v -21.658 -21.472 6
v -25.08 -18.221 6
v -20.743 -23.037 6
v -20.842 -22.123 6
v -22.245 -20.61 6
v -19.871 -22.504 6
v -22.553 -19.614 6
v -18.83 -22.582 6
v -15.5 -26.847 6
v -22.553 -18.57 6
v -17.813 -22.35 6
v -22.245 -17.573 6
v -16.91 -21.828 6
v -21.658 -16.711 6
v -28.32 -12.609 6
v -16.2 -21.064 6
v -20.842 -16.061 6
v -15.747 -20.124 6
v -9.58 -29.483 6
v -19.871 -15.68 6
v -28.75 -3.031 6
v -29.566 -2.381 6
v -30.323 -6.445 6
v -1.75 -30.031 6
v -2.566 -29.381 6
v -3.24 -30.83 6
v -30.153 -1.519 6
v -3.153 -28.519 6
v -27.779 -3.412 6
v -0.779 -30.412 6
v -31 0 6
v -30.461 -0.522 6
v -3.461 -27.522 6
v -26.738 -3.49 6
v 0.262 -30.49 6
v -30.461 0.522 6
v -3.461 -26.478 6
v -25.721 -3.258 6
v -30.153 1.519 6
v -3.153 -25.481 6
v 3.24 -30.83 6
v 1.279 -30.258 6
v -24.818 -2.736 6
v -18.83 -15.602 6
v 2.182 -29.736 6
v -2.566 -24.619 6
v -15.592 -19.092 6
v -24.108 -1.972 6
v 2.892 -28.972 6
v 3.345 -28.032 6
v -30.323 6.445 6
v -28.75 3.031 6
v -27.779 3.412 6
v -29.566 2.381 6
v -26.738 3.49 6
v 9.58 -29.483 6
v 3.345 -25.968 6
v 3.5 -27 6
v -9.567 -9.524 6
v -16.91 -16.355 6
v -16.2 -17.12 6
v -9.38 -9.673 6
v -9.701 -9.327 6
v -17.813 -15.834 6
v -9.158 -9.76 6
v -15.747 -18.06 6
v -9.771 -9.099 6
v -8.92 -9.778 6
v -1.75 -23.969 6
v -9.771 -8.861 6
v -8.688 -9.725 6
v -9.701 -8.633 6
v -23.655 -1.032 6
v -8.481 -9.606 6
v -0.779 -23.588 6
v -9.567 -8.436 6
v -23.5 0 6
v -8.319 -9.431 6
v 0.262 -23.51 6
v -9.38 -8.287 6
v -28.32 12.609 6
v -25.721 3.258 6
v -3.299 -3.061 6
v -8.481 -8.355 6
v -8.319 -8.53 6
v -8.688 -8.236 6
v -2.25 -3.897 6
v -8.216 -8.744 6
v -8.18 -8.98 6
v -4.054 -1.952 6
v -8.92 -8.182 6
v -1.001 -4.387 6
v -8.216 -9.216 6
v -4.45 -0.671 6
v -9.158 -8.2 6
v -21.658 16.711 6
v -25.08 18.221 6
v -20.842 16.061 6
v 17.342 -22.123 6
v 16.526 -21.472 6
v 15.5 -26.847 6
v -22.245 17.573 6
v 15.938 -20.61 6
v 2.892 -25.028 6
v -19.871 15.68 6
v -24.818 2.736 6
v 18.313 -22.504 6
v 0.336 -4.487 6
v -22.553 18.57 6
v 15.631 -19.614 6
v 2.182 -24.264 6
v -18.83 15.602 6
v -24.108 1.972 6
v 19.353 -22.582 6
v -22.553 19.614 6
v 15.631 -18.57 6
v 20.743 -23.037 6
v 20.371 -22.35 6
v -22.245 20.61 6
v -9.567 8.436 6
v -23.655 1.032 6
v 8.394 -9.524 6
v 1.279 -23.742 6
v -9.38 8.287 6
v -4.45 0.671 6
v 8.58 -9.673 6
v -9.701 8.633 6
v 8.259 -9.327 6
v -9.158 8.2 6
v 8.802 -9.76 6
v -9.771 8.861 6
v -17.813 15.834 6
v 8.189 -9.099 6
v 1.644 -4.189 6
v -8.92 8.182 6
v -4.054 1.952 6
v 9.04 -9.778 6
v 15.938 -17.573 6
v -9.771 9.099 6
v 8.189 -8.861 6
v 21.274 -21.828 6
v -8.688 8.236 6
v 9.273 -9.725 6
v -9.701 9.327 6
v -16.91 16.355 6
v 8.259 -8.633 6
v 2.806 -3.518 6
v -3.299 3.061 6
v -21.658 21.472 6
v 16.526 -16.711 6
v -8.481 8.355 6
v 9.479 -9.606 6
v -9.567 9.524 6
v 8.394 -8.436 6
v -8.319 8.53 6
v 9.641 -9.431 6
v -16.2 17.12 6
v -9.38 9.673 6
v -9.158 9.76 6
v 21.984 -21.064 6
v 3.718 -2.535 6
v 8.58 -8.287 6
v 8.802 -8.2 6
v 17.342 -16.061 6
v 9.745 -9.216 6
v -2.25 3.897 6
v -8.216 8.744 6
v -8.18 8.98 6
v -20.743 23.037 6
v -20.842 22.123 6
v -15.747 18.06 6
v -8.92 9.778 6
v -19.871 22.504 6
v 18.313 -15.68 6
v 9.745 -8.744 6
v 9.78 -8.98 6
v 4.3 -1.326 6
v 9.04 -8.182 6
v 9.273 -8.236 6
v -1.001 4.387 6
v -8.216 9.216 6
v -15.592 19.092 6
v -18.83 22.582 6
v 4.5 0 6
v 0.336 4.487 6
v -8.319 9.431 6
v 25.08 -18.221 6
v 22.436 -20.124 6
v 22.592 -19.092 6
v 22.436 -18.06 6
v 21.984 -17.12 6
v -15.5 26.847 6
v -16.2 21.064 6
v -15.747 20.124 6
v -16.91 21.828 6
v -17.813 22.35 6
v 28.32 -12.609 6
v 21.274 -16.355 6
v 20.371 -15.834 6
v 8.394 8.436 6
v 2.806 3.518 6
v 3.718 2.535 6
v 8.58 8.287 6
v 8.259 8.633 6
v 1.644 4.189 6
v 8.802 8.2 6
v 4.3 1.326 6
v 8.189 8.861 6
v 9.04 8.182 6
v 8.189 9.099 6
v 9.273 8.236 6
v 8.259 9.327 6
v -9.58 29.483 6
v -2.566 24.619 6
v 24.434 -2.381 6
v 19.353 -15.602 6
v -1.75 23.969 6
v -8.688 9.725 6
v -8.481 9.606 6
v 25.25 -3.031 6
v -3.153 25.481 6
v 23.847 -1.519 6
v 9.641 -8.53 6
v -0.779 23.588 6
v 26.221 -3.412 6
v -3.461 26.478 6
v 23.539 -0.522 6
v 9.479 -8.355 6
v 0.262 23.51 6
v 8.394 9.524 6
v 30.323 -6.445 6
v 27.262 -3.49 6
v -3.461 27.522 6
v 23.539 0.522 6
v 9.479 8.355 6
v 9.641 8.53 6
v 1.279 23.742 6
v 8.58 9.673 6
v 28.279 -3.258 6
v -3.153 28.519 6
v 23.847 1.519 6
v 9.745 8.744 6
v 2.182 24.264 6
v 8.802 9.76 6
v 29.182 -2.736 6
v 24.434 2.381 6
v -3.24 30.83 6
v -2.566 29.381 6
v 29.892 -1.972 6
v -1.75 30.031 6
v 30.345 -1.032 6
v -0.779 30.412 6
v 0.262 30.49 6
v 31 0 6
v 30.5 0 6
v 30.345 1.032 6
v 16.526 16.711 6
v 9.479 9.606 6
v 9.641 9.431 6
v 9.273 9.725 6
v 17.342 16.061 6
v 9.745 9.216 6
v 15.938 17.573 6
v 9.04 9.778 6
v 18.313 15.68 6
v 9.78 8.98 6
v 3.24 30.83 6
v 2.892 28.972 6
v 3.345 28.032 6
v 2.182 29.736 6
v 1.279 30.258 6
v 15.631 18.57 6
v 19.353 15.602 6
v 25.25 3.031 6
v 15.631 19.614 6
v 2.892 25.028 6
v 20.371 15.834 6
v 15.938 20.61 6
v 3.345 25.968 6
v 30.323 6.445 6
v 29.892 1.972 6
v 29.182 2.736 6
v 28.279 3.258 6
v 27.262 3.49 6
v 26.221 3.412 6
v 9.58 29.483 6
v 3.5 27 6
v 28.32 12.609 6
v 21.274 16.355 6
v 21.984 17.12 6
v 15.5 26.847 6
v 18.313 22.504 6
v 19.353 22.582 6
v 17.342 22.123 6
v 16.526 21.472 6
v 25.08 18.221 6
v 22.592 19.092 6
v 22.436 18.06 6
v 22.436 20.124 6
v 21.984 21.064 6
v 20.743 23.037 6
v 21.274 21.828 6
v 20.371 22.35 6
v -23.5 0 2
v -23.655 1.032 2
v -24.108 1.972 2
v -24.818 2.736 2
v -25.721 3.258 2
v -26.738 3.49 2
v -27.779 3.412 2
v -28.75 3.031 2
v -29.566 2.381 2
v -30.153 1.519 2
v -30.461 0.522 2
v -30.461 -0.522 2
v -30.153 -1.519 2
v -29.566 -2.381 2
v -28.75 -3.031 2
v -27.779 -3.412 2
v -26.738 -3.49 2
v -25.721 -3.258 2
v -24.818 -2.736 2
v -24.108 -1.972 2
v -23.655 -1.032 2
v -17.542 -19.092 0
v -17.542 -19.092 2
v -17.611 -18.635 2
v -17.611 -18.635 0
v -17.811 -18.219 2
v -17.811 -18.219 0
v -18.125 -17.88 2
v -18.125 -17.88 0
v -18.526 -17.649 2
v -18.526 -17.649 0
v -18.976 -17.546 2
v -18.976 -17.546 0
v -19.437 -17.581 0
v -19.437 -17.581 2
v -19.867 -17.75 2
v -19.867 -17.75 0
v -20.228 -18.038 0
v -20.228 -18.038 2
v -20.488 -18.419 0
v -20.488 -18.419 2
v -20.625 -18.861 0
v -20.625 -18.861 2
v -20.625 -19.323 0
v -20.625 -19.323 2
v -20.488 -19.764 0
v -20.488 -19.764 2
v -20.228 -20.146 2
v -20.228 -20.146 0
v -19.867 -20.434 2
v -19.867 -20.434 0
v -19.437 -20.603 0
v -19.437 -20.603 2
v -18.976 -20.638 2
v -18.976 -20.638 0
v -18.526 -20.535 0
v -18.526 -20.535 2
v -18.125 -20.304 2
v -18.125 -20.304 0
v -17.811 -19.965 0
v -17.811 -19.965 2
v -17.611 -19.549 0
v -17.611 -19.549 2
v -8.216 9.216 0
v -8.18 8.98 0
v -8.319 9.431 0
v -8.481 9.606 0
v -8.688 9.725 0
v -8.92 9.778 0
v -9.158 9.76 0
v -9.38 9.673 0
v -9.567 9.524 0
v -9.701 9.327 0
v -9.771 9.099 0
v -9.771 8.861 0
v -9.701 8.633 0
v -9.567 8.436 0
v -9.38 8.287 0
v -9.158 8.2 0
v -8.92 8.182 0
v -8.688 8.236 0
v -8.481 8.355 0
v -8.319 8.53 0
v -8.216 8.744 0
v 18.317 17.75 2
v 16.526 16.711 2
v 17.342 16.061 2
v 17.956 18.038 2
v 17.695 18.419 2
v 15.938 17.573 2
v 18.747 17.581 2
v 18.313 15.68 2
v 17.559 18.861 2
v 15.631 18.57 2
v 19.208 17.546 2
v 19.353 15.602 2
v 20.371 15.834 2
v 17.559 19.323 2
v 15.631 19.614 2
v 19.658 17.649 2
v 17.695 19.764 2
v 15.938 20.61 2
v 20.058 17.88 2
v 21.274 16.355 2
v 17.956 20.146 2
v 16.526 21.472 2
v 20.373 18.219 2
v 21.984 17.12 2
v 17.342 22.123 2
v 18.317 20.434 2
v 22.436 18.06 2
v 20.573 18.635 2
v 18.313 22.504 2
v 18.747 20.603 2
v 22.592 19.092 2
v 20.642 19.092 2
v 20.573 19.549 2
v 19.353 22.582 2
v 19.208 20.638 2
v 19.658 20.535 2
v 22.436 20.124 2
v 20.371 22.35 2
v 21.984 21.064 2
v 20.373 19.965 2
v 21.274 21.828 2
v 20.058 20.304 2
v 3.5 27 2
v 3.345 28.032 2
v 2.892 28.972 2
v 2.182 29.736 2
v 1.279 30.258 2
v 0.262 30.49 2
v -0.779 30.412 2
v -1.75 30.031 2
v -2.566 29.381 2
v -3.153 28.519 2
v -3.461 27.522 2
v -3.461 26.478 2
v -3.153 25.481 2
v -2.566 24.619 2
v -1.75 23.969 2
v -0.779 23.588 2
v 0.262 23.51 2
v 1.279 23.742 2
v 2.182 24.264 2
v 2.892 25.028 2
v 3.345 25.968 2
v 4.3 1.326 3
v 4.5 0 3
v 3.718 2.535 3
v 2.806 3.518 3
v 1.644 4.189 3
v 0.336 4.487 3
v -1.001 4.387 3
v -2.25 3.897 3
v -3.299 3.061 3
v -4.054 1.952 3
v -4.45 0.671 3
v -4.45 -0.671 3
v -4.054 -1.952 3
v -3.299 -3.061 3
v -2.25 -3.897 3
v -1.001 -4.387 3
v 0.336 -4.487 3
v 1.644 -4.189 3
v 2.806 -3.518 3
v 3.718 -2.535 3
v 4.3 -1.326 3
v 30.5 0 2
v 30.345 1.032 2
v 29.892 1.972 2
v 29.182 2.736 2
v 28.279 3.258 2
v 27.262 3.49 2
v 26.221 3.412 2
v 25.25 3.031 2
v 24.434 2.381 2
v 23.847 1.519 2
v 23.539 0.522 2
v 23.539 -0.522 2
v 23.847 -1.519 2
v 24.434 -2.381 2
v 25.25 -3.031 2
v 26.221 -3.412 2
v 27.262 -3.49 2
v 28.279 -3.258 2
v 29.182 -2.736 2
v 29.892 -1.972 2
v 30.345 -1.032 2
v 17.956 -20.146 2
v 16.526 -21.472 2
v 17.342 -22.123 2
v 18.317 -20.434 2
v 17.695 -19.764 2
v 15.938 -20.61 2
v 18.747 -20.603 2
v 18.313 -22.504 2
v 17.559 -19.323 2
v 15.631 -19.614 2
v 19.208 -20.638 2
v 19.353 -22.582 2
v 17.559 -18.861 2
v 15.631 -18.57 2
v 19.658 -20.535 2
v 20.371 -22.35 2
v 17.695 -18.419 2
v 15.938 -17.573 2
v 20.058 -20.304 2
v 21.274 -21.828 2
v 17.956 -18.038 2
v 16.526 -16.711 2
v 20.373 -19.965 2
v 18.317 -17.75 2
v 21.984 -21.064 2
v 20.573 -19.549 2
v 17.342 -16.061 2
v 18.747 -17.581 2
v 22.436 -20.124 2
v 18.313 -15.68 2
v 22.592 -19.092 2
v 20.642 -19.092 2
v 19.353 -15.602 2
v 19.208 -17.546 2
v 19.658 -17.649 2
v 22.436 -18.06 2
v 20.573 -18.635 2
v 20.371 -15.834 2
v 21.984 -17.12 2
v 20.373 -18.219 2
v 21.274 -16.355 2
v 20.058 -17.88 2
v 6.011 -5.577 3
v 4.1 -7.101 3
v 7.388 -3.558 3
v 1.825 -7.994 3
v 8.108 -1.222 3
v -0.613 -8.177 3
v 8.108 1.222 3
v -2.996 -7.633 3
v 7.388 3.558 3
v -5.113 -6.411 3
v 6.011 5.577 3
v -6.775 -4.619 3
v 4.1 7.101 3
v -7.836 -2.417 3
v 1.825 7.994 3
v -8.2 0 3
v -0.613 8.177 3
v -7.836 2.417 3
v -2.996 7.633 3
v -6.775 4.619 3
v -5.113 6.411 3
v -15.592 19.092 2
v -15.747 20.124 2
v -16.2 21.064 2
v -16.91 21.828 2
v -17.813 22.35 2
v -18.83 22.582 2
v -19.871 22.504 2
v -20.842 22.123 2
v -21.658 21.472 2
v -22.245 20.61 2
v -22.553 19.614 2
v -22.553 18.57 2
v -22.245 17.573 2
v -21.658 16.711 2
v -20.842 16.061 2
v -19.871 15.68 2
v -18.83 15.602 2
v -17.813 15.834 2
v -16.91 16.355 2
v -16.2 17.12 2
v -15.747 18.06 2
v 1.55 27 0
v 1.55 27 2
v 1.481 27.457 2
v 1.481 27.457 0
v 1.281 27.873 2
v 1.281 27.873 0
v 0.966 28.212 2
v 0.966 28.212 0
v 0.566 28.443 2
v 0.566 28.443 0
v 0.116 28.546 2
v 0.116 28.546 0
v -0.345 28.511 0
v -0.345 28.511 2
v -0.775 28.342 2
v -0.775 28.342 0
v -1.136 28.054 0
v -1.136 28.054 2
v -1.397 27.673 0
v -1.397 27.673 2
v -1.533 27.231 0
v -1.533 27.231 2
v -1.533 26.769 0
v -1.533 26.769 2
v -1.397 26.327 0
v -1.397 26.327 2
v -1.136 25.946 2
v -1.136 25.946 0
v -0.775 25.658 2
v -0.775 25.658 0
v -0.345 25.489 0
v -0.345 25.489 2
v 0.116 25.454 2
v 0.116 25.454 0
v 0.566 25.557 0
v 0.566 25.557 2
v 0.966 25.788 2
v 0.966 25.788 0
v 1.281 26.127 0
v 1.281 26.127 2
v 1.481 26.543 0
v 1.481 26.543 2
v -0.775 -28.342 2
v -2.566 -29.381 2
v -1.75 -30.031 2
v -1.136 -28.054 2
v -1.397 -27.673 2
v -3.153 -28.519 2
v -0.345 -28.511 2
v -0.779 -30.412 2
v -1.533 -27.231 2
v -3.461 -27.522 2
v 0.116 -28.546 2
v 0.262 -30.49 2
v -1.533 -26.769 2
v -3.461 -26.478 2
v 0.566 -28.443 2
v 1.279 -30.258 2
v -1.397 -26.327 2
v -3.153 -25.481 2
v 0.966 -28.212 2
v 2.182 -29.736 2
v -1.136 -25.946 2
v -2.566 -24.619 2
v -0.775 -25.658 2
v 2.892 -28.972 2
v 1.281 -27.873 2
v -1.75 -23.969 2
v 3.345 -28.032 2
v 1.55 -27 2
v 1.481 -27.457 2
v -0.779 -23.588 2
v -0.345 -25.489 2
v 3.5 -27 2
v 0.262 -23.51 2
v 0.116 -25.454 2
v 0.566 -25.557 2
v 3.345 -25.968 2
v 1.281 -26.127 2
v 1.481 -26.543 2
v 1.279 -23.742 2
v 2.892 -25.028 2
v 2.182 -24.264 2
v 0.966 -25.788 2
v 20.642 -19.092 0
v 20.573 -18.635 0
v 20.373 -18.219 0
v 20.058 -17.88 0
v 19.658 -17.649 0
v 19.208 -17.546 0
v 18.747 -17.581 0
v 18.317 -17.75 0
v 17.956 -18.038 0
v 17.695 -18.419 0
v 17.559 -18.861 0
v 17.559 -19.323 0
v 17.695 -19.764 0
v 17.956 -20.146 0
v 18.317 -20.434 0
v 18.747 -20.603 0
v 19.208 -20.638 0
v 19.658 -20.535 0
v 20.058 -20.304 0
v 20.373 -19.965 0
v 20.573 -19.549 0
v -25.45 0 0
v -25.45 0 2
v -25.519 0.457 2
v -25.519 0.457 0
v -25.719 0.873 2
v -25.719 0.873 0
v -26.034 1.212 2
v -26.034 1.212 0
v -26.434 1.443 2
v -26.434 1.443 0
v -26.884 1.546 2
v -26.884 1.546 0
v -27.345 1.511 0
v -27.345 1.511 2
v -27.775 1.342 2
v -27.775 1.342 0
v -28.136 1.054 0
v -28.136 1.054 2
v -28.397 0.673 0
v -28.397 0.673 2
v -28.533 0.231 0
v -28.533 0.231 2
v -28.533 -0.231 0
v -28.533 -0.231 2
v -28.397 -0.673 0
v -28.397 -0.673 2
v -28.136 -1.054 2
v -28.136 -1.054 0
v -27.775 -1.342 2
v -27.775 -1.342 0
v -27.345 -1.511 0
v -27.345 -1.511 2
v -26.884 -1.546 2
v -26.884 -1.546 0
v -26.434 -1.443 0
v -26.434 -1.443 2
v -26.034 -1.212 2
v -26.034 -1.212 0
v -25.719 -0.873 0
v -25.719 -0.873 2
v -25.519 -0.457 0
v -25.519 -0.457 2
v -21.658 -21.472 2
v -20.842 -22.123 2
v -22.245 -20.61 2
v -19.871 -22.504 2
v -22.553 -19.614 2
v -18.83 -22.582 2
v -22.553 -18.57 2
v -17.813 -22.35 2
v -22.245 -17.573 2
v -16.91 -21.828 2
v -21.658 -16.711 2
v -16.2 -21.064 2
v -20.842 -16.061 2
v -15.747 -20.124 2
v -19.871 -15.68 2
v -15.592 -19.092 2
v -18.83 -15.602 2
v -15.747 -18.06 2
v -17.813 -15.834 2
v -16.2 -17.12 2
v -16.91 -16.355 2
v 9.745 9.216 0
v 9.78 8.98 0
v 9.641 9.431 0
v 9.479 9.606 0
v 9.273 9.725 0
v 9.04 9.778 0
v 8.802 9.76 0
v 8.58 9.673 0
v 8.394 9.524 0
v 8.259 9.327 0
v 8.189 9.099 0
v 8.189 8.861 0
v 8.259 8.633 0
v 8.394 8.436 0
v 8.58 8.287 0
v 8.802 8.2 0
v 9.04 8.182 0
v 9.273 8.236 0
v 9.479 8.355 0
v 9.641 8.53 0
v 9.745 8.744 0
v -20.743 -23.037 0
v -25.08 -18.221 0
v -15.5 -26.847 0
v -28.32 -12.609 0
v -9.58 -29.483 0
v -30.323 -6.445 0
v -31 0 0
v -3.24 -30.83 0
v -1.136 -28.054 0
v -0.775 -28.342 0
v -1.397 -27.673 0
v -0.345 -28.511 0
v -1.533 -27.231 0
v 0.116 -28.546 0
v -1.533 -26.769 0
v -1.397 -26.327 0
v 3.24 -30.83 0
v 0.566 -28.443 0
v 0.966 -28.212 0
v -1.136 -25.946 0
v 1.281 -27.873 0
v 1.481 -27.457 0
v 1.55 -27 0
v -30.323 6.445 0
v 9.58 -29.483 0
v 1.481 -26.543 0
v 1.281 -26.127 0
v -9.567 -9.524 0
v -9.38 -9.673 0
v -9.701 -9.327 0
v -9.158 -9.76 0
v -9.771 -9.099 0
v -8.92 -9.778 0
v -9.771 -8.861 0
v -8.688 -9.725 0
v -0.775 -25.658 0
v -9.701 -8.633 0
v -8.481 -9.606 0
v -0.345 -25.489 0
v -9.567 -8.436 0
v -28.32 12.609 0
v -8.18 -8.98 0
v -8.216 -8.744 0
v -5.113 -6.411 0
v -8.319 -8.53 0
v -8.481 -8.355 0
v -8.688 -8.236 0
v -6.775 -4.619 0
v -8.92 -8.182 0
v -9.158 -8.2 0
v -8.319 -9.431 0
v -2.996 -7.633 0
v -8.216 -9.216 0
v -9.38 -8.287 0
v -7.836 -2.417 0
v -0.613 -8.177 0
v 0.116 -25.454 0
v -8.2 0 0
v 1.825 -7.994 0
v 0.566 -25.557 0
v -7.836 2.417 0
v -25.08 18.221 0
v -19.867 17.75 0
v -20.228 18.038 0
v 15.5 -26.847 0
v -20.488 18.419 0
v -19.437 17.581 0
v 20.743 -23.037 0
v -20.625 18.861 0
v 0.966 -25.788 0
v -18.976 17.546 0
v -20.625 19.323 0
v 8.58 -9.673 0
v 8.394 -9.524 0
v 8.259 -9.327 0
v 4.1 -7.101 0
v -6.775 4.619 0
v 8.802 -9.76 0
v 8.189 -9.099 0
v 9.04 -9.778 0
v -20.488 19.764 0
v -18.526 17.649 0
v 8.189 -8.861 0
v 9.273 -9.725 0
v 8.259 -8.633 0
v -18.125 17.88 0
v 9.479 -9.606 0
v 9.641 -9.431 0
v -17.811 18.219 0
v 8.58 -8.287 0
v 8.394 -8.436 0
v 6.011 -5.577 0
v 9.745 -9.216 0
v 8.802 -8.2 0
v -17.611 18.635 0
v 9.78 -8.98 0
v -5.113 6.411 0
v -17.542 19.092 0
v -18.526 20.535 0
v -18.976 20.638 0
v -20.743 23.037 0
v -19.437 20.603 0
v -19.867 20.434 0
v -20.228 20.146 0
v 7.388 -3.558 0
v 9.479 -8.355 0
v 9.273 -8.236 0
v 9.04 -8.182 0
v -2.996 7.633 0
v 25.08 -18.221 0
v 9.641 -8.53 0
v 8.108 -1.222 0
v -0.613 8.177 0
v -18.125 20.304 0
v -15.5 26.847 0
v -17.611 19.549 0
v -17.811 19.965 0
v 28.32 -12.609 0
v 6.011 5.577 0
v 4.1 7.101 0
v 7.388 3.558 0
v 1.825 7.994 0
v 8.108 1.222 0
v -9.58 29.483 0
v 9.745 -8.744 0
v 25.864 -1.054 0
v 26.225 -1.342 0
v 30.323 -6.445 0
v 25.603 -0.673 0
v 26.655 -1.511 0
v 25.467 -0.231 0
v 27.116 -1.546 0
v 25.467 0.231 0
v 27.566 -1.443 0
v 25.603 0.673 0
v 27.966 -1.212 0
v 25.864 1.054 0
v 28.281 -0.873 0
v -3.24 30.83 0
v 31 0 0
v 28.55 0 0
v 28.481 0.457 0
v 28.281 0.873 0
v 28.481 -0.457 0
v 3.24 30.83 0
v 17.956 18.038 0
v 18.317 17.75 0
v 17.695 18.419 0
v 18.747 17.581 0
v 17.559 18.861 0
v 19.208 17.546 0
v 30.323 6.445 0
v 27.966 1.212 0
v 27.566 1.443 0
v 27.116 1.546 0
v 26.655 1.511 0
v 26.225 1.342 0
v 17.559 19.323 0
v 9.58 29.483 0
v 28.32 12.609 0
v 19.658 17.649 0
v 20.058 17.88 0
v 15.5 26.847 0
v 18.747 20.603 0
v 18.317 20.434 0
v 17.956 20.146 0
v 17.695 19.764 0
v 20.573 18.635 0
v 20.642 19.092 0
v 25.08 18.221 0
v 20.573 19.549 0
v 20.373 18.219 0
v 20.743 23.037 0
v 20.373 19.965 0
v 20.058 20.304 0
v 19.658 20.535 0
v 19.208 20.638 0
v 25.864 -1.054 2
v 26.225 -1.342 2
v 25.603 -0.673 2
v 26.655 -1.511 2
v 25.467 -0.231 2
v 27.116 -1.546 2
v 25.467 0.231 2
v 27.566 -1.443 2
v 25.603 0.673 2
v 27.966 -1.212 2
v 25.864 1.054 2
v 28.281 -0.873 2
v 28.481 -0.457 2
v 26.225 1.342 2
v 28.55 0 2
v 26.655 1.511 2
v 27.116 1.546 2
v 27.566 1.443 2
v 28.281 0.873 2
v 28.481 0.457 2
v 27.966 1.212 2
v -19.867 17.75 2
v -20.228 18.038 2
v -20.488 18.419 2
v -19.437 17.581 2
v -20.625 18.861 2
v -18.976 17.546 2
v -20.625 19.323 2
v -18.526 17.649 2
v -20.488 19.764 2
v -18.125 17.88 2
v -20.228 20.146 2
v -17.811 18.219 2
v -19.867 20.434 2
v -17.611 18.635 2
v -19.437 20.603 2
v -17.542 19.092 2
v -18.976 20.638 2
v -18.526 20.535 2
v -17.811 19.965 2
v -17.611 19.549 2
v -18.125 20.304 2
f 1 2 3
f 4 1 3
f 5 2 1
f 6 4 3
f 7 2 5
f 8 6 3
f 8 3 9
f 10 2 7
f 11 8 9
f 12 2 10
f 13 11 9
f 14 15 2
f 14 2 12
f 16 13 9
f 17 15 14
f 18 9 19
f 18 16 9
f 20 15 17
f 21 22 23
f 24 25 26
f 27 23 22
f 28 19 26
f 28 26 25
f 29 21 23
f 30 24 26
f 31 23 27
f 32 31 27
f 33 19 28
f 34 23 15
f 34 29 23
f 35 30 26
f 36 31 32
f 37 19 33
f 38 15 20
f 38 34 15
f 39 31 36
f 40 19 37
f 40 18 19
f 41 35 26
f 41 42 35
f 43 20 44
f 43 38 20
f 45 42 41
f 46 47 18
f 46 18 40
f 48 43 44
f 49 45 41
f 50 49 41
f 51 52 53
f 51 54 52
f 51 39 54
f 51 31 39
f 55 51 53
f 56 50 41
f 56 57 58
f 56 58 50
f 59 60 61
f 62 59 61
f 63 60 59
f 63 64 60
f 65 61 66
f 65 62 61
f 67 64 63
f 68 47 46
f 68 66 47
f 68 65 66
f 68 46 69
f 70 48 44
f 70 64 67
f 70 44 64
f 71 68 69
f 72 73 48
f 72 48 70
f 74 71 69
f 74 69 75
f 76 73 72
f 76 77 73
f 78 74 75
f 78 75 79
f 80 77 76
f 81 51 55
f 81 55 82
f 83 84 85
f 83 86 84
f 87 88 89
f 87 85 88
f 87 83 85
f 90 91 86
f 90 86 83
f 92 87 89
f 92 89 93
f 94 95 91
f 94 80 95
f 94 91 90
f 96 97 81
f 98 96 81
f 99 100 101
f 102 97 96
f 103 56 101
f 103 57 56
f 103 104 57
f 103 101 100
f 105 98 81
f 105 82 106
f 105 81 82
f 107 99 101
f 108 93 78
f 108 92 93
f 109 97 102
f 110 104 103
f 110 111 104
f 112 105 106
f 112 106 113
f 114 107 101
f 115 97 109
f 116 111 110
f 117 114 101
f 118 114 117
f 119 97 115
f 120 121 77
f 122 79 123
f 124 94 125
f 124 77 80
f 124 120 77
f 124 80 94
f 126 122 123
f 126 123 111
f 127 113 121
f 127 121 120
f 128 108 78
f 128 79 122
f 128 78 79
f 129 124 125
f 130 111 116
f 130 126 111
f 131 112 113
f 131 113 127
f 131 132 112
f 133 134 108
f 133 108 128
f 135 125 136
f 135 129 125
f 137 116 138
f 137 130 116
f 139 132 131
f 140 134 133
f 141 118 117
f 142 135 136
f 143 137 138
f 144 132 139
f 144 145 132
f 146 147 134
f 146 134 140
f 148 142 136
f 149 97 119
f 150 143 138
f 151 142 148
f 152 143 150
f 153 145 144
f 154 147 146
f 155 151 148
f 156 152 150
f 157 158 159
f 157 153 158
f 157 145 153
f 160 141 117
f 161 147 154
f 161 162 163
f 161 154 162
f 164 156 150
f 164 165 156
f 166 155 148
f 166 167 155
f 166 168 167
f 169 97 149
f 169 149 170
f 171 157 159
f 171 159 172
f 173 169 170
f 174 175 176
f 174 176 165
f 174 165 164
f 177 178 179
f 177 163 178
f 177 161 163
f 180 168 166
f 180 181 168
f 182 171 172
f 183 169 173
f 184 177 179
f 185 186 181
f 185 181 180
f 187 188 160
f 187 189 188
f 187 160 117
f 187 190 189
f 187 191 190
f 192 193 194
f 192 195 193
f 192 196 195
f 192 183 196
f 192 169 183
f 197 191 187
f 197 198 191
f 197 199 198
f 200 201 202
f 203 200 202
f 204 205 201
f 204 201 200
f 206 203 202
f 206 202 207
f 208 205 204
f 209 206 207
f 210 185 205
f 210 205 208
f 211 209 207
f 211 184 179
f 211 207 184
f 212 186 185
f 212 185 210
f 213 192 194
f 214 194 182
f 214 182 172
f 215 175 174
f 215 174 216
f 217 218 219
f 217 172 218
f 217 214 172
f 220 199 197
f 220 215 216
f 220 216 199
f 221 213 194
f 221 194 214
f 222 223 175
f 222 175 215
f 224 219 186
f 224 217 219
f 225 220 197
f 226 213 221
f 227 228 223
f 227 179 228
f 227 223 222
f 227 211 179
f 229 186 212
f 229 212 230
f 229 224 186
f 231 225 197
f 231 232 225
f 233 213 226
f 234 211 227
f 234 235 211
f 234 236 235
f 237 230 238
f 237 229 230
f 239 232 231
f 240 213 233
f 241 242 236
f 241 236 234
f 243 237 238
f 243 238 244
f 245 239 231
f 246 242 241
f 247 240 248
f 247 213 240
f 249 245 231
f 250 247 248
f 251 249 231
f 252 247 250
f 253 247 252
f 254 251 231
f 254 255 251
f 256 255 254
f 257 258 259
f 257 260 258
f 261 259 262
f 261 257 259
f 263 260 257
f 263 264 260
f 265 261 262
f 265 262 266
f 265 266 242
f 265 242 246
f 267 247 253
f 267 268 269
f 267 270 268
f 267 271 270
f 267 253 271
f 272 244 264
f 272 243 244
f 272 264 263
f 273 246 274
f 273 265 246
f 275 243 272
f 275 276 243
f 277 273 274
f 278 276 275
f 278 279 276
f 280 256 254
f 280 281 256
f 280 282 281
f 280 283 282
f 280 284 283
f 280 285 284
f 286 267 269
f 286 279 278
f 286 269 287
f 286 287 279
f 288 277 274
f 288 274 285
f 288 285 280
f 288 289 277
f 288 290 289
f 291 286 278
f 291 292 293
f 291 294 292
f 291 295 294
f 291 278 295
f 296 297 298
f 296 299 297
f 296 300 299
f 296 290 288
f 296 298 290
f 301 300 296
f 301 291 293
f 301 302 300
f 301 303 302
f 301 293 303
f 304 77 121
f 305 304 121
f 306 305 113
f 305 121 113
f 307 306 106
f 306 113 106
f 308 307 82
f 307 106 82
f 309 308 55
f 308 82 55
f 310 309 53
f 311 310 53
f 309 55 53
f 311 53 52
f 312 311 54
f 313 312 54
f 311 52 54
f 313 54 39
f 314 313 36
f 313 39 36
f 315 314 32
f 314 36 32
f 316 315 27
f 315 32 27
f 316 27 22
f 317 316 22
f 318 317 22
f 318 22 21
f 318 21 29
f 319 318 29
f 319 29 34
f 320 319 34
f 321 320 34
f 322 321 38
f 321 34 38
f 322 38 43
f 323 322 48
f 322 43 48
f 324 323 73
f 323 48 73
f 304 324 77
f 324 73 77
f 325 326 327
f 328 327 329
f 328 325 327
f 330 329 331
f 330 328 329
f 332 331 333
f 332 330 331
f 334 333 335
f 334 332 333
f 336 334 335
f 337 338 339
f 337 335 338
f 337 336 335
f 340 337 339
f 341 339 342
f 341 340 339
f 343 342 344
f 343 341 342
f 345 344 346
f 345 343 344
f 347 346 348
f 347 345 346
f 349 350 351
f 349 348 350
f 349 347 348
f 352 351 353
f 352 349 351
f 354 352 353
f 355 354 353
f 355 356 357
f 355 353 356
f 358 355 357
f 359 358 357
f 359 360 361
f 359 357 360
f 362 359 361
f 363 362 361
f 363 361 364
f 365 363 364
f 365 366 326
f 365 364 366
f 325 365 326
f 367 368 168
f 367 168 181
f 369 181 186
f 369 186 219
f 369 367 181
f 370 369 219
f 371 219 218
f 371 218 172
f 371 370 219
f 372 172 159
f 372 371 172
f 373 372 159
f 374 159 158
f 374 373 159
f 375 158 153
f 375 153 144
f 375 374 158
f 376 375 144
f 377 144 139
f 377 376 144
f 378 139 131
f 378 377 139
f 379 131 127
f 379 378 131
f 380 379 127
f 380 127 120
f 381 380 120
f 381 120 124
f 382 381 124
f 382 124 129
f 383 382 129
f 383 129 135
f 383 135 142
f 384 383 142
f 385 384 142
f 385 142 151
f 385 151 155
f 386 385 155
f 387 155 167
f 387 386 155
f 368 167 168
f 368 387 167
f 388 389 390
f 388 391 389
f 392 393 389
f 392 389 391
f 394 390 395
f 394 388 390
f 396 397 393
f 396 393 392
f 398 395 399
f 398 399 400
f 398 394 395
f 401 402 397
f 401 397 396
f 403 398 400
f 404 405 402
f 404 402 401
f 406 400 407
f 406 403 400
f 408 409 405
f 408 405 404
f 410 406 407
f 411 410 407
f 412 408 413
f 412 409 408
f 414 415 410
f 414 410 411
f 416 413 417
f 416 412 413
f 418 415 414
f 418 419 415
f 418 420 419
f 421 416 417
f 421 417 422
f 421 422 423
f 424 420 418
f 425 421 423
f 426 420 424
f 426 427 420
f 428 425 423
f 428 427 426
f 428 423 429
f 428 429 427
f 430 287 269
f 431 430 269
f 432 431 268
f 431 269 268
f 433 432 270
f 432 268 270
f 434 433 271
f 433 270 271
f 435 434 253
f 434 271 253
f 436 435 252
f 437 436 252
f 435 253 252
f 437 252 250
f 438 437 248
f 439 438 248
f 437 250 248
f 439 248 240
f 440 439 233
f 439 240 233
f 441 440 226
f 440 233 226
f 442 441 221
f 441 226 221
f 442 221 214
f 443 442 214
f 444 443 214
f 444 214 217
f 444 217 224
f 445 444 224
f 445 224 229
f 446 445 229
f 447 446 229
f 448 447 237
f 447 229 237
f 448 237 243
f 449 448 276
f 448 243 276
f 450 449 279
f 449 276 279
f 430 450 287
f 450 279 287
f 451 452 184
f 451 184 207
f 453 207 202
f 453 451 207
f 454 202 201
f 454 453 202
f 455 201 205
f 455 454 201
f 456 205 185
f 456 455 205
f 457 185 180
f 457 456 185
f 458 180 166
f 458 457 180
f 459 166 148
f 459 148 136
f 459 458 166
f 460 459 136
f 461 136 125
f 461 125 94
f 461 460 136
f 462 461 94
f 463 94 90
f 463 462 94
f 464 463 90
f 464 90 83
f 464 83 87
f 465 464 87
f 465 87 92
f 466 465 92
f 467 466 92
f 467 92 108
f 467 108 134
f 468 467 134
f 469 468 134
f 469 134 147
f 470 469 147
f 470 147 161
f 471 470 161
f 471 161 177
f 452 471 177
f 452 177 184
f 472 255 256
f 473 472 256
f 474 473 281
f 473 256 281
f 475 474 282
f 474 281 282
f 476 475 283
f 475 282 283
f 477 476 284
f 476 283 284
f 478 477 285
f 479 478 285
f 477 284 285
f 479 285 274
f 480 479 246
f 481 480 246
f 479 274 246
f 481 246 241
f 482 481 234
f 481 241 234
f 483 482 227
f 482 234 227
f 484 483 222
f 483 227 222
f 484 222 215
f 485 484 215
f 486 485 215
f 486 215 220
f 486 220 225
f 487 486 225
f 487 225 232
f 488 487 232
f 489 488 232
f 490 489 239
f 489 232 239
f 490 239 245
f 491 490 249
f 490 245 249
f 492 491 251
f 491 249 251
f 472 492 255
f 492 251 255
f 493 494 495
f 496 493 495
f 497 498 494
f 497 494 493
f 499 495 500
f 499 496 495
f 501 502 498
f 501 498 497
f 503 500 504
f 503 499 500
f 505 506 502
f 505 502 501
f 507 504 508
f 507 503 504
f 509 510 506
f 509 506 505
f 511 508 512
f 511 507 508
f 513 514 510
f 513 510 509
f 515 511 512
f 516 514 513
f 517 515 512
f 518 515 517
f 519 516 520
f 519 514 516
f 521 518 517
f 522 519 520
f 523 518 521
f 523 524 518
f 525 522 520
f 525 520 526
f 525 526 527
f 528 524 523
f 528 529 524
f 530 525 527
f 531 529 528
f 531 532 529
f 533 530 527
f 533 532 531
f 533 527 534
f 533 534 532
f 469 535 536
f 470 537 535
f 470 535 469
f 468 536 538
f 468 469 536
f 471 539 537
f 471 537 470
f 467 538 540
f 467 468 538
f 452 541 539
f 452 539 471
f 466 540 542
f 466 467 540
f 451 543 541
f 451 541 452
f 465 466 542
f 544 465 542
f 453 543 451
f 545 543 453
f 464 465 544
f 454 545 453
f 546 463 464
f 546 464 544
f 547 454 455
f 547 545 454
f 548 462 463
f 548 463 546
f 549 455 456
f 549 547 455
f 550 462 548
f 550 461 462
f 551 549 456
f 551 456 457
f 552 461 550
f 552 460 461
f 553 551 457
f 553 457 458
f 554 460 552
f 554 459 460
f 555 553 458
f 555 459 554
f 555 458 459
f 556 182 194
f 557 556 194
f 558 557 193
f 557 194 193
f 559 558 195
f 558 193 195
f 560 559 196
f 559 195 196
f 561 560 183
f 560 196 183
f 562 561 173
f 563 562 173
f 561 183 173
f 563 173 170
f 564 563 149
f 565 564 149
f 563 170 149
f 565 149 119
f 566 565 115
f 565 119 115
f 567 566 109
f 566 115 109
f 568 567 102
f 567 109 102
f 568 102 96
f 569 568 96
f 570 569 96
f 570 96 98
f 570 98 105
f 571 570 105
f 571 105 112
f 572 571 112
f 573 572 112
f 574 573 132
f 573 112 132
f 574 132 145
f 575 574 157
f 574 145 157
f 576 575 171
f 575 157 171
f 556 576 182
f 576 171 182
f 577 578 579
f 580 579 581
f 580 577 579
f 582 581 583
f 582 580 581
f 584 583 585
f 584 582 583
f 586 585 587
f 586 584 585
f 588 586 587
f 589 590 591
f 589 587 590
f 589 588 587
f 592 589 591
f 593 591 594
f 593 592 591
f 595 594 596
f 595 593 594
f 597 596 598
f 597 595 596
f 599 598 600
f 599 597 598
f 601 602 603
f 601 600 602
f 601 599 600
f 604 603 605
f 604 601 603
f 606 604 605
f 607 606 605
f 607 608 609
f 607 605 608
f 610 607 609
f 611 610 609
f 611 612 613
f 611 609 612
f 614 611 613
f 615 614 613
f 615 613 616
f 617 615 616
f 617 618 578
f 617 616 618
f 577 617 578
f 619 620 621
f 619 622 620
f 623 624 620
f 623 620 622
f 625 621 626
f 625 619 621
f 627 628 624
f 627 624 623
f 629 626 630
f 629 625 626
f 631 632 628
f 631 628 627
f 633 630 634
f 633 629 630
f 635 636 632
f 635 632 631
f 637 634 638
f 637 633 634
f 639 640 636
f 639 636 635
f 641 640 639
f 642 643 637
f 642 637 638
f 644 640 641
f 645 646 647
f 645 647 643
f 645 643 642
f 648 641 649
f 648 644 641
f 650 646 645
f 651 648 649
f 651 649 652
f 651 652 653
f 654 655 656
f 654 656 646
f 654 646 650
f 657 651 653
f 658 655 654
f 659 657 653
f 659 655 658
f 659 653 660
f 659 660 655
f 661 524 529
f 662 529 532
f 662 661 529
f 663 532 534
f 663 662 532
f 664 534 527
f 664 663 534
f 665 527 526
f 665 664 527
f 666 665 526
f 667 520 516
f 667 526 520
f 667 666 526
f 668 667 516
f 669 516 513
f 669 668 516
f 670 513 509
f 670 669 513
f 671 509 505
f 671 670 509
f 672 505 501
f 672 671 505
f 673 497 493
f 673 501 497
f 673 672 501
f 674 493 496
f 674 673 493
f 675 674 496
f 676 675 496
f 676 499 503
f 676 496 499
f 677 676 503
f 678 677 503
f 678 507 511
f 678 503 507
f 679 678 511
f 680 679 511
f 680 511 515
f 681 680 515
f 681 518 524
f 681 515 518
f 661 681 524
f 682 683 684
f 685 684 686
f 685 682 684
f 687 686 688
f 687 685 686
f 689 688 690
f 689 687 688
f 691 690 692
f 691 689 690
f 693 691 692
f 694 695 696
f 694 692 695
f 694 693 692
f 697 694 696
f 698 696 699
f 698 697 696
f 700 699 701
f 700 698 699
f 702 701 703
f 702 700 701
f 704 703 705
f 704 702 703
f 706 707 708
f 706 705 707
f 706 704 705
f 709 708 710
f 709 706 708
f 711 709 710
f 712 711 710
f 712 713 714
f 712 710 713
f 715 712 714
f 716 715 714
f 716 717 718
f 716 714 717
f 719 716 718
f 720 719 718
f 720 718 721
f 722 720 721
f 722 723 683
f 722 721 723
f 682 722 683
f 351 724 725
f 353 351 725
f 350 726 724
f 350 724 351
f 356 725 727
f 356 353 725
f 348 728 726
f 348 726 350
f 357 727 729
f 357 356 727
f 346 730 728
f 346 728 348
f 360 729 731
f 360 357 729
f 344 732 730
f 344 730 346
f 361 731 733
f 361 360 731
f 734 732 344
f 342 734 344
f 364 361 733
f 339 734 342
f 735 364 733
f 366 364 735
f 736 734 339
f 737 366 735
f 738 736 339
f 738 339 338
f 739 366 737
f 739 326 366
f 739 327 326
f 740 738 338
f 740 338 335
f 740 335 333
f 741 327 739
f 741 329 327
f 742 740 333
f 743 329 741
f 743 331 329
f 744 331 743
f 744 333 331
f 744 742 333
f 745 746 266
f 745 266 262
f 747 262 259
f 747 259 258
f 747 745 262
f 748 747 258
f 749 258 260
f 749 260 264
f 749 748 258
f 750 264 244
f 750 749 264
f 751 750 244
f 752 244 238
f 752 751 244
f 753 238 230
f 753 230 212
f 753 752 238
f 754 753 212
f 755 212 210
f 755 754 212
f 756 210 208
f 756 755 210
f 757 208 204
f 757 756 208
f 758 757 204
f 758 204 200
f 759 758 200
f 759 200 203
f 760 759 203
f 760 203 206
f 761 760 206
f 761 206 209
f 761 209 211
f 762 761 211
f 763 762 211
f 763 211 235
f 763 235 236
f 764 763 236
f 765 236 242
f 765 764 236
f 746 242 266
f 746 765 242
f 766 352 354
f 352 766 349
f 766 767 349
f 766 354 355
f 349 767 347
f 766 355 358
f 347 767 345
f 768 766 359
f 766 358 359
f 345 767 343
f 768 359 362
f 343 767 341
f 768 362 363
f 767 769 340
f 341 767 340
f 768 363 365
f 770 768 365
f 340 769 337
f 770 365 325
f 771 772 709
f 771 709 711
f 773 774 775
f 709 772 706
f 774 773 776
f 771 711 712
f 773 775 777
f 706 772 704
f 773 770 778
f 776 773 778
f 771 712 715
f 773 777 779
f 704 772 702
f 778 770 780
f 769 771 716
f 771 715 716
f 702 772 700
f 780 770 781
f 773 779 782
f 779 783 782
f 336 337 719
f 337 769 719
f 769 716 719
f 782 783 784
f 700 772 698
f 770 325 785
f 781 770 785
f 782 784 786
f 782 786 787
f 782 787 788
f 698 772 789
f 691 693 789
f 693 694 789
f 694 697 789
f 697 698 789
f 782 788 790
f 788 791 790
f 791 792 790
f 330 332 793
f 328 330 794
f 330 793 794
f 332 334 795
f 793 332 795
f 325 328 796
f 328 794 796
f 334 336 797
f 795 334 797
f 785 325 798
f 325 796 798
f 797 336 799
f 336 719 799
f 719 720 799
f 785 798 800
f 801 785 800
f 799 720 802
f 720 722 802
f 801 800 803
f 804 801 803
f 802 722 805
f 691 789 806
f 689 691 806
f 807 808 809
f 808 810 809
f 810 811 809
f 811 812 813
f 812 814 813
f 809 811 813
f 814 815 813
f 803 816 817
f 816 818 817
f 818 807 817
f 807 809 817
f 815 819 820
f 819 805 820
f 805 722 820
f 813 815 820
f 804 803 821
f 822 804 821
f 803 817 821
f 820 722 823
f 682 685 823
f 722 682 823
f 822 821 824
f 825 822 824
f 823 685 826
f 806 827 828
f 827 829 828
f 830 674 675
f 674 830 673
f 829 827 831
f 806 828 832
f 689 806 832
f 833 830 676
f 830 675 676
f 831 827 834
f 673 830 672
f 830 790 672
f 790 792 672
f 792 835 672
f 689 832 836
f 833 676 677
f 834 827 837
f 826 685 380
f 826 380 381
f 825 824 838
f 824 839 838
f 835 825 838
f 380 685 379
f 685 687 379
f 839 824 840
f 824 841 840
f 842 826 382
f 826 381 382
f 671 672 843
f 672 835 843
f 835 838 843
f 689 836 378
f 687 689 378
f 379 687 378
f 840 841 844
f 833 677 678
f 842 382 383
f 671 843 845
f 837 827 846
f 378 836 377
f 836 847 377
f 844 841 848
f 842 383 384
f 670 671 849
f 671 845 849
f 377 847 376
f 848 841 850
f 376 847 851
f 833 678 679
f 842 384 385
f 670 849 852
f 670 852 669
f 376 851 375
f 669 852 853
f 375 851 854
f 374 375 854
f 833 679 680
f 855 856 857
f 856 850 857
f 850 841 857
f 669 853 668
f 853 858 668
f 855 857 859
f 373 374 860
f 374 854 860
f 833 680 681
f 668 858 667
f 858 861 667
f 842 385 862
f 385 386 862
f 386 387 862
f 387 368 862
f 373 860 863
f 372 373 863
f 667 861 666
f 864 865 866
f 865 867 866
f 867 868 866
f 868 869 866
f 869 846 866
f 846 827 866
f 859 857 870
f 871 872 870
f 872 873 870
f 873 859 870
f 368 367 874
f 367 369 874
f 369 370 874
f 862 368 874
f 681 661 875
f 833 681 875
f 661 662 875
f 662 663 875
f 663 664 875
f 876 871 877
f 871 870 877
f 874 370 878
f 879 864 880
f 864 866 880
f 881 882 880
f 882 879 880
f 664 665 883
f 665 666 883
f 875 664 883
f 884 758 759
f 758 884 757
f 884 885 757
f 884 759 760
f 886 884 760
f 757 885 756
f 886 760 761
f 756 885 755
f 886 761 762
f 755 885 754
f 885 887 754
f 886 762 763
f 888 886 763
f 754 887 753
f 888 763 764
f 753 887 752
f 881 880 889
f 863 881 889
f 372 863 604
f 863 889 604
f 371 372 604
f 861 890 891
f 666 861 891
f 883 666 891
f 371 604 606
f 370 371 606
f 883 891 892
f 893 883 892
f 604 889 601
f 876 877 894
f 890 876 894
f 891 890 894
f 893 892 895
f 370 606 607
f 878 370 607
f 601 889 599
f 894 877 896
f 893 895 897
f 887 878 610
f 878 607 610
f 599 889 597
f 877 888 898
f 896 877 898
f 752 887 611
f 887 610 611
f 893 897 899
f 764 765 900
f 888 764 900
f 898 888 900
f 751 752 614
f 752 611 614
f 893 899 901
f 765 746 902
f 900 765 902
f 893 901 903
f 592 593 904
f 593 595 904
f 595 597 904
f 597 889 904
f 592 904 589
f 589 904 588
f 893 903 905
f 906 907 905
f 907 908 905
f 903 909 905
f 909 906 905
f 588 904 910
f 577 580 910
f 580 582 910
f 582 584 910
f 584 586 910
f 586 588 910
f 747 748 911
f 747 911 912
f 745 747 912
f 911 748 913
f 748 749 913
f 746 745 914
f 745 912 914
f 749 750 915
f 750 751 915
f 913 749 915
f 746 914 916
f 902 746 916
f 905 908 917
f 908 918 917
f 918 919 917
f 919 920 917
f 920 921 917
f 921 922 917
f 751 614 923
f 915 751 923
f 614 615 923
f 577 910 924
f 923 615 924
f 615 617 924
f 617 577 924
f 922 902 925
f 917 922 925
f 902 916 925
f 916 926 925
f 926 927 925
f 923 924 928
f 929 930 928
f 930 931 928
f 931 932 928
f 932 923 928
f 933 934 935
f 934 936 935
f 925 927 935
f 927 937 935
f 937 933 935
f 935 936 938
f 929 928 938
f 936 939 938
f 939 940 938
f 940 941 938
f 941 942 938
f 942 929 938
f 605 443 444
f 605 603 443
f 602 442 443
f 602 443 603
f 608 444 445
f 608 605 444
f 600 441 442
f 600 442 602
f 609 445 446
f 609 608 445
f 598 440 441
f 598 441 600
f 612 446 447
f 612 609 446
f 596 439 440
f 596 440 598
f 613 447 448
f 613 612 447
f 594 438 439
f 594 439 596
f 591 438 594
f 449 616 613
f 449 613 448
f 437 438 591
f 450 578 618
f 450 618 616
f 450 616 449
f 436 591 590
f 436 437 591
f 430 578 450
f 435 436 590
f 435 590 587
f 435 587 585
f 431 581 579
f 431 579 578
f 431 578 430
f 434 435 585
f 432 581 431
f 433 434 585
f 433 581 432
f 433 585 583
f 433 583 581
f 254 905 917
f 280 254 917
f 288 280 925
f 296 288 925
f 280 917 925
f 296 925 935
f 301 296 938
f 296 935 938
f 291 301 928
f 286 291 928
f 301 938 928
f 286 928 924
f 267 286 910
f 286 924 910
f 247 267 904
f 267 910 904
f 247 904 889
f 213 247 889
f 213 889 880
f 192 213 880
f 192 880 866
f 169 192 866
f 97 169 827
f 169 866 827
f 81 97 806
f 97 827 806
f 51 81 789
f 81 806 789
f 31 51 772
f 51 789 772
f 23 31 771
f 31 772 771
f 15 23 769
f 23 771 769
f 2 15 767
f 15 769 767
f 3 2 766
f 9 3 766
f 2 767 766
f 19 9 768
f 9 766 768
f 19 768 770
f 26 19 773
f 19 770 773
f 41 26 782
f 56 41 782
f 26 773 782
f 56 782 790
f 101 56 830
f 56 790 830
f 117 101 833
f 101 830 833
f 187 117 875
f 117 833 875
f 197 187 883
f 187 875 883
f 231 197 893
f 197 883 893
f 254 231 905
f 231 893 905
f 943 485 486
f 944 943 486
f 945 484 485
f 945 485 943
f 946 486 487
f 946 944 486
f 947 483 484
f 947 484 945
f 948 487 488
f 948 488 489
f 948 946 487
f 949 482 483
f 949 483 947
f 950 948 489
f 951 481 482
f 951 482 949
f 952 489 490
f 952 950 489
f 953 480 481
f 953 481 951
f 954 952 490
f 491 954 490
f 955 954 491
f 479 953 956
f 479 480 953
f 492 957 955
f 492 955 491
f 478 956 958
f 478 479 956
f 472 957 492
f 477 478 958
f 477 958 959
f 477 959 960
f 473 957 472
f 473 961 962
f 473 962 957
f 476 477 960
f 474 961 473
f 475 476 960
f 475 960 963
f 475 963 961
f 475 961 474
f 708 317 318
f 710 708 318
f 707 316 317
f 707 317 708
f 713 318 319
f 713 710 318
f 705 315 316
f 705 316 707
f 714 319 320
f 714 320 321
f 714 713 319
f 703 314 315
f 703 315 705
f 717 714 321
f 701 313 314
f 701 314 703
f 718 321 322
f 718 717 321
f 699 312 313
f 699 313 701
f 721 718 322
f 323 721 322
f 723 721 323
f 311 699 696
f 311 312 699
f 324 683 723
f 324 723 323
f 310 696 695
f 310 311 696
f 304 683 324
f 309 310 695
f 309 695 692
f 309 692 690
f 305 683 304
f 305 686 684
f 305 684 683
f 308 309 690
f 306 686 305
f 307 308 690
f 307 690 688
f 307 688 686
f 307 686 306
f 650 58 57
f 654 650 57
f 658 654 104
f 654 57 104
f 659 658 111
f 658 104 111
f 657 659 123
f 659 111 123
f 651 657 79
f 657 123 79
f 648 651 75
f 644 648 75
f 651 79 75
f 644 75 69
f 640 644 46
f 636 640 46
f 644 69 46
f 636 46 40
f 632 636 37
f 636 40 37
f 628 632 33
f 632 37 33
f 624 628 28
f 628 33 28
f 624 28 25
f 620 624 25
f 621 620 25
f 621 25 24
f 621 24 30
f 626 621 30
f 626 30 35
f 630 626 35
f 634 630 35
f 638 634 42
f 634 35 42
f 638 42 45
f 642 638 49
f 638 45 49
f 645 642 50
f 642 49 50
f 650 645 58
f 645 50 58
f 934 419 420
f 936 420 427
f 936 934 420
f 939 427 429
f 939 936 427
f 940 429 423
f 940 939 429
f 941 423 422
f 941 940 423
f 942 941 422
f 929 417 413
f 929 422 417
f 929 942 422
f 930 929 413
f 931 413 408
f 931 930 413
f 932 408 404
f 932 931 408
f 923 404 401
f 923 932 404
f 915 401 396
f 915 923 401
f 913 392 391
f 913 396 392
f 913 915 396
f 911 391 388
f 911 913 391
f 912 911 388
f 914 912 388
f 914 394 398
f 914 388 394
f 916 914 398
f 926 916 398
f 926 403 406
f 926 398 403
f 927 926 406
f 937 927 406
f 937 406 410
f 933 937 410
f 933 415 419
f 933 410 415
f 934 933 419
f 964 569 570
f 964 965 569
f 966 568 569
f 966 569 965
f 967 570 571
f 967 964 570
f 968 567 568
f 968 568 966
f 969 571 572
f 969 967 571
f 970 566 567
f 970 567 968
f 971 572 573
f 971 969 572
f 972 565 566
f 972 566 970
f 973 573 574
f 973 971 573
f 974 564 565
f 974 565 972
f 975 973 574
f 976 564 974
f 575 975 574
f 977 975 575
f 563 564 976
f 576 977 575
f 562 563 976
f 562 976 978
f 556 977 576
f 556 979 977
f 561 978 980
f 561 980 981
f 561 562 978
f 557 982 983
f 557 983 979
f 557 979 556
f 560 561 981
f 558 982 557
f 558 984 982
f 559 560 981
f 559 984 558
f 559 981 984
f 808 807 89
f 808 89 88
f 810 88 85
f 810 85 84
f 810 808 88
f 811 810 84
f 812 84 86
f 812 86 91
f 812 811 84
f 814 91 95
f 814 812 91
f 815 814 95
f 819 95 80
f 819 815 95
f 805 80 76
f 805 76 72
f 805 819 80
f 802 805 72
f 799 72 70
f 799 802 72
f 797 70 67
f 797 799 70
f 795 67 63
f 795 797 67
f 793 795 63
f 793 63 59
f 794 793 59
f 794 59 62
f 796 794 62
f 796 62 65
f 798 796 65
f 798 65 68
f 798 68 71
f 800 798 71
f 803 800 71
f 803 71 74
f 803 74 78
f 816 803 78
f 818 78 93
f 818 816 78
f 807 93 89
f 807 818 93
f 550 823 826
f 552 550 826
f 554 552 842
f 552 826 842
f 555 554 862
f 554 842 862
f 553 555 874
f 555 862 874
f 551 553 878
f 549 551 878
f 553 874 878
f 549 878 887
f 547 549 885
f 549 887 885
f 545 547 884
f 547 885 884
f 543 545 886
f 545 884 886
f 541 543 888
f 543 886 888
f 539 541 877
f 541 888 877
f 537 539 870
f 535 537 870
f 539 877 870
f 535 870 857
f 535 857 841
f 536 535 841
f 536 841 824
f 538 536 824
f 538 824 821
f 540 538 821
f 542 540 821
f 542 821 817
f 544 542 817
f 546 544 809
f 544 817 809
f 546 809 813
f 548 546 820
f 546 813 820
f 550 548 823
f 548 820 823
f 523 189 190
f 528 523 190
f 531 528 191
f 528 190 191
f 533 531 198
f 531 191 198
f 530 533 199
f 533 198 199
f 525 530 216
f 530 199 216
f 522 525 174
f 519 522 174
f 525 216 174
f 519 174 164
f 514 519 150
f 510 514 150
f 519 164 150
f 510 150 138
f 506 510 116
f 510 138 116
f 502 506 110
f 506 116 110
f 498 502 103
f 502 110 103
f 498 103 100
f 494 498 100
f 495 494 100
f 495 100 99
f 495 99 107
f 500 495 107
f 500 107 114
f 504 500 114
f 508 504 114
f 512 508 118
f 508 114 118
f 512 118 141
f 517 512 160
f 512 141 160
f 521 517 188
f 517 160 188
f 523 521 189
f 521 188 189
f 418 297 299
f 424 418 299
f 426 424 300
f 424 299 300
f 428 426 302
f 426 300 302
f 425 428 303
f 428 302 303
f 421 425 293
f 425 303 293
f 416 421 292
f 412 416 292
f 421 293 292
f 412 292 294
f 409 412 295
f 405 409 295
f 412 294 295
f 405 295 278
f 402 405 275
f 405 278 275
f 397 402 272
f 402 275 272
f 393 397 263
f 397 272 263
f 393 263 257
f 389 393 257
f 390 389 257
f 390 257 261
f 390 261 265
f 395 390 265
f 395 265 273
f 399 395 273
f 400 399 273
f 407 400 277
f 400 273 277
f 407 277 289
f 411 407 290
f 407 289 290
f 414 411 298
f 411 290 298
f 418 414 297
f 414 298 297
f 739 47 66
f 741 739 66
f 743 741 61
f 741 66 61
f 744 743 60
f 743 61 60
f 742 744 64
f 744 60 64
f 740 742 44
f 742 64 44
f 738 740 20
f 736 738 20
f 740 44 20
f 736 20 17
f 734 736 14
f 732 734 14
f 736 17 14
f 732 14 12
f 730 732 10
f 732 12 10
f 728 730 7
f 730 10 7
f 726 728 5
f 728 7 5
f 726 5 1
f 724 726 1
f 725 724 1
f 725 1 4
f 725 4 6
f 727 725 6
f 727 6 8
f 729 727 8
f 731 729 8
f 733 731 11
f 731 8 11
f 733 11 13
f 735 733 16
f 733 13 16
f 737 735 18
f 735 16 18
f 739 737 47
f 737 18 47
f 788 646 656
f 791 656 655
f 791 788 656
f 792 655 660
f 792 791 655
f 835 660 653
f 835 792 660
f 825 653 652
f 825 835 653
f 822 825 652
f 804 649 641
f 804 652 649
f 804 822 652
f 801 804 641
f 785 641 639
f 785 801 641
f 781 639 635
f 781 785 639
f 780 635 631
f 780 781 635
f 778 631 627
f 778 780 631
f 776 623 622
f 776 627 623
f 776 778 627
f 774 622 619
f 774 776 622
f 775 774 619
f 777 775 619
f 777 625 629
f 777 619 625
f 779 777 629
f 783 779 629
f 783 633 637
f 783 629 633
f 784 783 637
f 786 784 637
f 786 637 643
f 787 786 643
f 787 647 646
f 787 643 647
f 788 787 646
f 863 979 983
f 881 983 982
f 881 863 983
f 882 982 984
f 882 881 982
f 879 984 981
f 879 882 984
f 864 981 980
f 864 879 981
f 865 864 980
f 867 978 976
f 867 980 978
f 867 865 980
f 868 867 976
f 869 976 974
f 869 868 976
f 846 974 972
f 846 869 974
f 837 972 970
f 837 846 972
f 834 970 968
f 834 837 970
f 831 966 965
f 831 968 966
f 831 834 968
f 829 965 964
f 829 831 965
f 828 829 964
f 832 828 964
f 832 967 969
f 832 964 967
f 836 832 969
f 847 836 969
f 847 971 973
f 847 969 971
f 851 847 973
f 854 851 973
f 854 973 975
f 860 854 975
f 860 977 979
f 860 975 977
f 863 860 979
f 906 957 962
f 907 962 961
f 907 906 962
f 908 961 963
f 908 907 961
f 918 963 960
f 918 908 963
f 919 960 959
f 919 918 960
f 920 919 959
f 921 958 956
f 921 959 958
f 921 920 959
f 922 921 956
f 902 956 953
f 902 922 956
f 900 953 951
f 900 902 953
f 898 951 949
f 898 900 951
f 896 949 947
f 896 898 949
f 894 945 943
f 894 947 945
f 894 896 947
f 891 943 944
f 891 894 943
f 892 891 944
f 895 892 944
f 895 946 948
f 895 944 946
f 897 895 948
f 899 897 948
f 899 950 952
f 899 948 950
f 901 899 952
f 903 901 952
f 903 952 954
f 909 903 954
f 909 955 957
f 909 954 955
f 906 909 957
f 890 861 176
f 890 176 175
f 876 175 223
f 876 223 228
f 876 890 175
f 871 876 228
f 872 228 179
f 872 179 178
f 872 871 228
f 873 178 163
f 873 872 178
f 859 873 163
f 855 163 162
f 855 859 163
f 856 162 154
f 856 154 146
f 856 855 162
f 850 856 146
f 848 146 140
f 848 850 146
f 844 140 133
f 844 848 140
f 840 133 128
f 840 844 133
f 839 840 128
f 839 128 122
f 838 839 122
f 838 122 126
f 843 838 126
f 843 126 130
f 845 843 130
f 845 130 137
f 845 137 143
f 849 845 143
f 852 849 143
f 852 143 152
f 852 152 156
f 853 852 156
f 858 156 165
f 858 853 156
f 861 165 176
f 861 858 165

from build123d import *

# Parameters (mm, degrees)
SKETCH1_R           = 31
SKETCH1_R_2         = 4.5
SKETCH1_R_3         = 0.8
SKETCH1_R_4         = 1.55
BOSS_EXTRUDE2_DEPTH = 6
SKETCH5_R           = 8.2
CUT_EXTRUDE3_DEPTH  = 3
SKETCH6_R           = 3.5
CUT_EXTRUDE4_DEPTH  = 4


with BuildPart() as part:
    # Sketch1 → Boss-Extrude2 (new body)
    with BuildSketch(Plane.XY):
        Circle(SKETCH1_R)
        Circle(SKETCH1_R_2, mode=Mode.SUBTRACT)
        with Locations((8.980256121, 8.980256121)):
            Circle(SKETCH1_R_3, mode=Mode.SUBTRACT)
        with Locations((8.980256121, -8.980256121)):
            Circle(SKETCH1_R_3, mode=Mode.SUBTRACT)
        with Locations((-8.980256121, -8.980256121)):
            Circle(SKETCH1_R_3, mode=Mode.SUBTRACT)
        with Locations((-8.980256121, 8.980256121)):
            Circle(SKETCH1_R_3, mode=Mode.SUBTRACT)
        with Locations((-27, 0)):
            Circle(SKETCH1_R_4, mode=Mode.SUBTRACT)
        with Locations((-19.091883092, 19.091883092)):
            Circle(SKETCH1_R_4, mode=Mode.SUBTRACT)
        with Locations((0, 27)):
            Circle(SKETCH1_R_4, mode=Mode.SUBTRACT)
        with Locations((19.091883092, 19.091883092)):
            Circle(SKETCH1_R_4, mode=Mode.SUBTRACT)
        with Locations((27, 0)):
            Circle(SKETCH1_R_4, mode=Mode.SUBTRACT)
        with Locations((19.091883092, -19.091883092)):
            Circle(SKETCH1_R_4, mode=Mode.SUBTRACT)
        with Locations((0, -27)):
            Circle(SKETCH1_R_4, mode=Mode.SUBTRACT)
        with Locations((-19.091883092, -19.091883092)):
            Circle(SKETCH1_R_4, mode=Mode.SUBTRACT)
    extrude(amount=BOSS_EXTRUDE2_DEPTH)

    # Sketch5 → Cut-Extrude3 (cut)
    with BuildSketch(Plane(origin=(0, 0, 0), x_dir=(-1, 0, 0), z_dir=(0, 0, -1))):
        Circle(SKETCH5_R)
    extrude(amount=-CUT_EXTRUDE3_DEPTH, mode=Mode.SUBTRACT)

    # Sketch6 → Cut-Extrude4 (cut)
    with BuildSketch(Plane.XY.offset(6)):
        with Locations((0, 27)):
            Circle(SKETCH6_R)
        with Locations((19.091883092, 19.091883092)):
            Circle(SKETCH6_R)
        with Locations((27, 0)):
            Circle(SKETCH6_R)
        with Locations((19.091883092, -19.091883092)):
            Circle(SKETCH6_R)
        with Locations((0, -27)):
            Circle(SKETCH6_R)
        with Locations((-19.091883092, -19.091883092)):
            Circle(SKETCH6_R)
        with Locations((-27, 0)):
            Circle(SKETCH6_R)
        with Locations((-19.091883092, 19.091883092)):
            Circle(SKETCH6_R)
    extrude(amount=-CUT_EXTRUDE4_DEPTH, mode=Mode.SUBTRACT)


solid = part.part
